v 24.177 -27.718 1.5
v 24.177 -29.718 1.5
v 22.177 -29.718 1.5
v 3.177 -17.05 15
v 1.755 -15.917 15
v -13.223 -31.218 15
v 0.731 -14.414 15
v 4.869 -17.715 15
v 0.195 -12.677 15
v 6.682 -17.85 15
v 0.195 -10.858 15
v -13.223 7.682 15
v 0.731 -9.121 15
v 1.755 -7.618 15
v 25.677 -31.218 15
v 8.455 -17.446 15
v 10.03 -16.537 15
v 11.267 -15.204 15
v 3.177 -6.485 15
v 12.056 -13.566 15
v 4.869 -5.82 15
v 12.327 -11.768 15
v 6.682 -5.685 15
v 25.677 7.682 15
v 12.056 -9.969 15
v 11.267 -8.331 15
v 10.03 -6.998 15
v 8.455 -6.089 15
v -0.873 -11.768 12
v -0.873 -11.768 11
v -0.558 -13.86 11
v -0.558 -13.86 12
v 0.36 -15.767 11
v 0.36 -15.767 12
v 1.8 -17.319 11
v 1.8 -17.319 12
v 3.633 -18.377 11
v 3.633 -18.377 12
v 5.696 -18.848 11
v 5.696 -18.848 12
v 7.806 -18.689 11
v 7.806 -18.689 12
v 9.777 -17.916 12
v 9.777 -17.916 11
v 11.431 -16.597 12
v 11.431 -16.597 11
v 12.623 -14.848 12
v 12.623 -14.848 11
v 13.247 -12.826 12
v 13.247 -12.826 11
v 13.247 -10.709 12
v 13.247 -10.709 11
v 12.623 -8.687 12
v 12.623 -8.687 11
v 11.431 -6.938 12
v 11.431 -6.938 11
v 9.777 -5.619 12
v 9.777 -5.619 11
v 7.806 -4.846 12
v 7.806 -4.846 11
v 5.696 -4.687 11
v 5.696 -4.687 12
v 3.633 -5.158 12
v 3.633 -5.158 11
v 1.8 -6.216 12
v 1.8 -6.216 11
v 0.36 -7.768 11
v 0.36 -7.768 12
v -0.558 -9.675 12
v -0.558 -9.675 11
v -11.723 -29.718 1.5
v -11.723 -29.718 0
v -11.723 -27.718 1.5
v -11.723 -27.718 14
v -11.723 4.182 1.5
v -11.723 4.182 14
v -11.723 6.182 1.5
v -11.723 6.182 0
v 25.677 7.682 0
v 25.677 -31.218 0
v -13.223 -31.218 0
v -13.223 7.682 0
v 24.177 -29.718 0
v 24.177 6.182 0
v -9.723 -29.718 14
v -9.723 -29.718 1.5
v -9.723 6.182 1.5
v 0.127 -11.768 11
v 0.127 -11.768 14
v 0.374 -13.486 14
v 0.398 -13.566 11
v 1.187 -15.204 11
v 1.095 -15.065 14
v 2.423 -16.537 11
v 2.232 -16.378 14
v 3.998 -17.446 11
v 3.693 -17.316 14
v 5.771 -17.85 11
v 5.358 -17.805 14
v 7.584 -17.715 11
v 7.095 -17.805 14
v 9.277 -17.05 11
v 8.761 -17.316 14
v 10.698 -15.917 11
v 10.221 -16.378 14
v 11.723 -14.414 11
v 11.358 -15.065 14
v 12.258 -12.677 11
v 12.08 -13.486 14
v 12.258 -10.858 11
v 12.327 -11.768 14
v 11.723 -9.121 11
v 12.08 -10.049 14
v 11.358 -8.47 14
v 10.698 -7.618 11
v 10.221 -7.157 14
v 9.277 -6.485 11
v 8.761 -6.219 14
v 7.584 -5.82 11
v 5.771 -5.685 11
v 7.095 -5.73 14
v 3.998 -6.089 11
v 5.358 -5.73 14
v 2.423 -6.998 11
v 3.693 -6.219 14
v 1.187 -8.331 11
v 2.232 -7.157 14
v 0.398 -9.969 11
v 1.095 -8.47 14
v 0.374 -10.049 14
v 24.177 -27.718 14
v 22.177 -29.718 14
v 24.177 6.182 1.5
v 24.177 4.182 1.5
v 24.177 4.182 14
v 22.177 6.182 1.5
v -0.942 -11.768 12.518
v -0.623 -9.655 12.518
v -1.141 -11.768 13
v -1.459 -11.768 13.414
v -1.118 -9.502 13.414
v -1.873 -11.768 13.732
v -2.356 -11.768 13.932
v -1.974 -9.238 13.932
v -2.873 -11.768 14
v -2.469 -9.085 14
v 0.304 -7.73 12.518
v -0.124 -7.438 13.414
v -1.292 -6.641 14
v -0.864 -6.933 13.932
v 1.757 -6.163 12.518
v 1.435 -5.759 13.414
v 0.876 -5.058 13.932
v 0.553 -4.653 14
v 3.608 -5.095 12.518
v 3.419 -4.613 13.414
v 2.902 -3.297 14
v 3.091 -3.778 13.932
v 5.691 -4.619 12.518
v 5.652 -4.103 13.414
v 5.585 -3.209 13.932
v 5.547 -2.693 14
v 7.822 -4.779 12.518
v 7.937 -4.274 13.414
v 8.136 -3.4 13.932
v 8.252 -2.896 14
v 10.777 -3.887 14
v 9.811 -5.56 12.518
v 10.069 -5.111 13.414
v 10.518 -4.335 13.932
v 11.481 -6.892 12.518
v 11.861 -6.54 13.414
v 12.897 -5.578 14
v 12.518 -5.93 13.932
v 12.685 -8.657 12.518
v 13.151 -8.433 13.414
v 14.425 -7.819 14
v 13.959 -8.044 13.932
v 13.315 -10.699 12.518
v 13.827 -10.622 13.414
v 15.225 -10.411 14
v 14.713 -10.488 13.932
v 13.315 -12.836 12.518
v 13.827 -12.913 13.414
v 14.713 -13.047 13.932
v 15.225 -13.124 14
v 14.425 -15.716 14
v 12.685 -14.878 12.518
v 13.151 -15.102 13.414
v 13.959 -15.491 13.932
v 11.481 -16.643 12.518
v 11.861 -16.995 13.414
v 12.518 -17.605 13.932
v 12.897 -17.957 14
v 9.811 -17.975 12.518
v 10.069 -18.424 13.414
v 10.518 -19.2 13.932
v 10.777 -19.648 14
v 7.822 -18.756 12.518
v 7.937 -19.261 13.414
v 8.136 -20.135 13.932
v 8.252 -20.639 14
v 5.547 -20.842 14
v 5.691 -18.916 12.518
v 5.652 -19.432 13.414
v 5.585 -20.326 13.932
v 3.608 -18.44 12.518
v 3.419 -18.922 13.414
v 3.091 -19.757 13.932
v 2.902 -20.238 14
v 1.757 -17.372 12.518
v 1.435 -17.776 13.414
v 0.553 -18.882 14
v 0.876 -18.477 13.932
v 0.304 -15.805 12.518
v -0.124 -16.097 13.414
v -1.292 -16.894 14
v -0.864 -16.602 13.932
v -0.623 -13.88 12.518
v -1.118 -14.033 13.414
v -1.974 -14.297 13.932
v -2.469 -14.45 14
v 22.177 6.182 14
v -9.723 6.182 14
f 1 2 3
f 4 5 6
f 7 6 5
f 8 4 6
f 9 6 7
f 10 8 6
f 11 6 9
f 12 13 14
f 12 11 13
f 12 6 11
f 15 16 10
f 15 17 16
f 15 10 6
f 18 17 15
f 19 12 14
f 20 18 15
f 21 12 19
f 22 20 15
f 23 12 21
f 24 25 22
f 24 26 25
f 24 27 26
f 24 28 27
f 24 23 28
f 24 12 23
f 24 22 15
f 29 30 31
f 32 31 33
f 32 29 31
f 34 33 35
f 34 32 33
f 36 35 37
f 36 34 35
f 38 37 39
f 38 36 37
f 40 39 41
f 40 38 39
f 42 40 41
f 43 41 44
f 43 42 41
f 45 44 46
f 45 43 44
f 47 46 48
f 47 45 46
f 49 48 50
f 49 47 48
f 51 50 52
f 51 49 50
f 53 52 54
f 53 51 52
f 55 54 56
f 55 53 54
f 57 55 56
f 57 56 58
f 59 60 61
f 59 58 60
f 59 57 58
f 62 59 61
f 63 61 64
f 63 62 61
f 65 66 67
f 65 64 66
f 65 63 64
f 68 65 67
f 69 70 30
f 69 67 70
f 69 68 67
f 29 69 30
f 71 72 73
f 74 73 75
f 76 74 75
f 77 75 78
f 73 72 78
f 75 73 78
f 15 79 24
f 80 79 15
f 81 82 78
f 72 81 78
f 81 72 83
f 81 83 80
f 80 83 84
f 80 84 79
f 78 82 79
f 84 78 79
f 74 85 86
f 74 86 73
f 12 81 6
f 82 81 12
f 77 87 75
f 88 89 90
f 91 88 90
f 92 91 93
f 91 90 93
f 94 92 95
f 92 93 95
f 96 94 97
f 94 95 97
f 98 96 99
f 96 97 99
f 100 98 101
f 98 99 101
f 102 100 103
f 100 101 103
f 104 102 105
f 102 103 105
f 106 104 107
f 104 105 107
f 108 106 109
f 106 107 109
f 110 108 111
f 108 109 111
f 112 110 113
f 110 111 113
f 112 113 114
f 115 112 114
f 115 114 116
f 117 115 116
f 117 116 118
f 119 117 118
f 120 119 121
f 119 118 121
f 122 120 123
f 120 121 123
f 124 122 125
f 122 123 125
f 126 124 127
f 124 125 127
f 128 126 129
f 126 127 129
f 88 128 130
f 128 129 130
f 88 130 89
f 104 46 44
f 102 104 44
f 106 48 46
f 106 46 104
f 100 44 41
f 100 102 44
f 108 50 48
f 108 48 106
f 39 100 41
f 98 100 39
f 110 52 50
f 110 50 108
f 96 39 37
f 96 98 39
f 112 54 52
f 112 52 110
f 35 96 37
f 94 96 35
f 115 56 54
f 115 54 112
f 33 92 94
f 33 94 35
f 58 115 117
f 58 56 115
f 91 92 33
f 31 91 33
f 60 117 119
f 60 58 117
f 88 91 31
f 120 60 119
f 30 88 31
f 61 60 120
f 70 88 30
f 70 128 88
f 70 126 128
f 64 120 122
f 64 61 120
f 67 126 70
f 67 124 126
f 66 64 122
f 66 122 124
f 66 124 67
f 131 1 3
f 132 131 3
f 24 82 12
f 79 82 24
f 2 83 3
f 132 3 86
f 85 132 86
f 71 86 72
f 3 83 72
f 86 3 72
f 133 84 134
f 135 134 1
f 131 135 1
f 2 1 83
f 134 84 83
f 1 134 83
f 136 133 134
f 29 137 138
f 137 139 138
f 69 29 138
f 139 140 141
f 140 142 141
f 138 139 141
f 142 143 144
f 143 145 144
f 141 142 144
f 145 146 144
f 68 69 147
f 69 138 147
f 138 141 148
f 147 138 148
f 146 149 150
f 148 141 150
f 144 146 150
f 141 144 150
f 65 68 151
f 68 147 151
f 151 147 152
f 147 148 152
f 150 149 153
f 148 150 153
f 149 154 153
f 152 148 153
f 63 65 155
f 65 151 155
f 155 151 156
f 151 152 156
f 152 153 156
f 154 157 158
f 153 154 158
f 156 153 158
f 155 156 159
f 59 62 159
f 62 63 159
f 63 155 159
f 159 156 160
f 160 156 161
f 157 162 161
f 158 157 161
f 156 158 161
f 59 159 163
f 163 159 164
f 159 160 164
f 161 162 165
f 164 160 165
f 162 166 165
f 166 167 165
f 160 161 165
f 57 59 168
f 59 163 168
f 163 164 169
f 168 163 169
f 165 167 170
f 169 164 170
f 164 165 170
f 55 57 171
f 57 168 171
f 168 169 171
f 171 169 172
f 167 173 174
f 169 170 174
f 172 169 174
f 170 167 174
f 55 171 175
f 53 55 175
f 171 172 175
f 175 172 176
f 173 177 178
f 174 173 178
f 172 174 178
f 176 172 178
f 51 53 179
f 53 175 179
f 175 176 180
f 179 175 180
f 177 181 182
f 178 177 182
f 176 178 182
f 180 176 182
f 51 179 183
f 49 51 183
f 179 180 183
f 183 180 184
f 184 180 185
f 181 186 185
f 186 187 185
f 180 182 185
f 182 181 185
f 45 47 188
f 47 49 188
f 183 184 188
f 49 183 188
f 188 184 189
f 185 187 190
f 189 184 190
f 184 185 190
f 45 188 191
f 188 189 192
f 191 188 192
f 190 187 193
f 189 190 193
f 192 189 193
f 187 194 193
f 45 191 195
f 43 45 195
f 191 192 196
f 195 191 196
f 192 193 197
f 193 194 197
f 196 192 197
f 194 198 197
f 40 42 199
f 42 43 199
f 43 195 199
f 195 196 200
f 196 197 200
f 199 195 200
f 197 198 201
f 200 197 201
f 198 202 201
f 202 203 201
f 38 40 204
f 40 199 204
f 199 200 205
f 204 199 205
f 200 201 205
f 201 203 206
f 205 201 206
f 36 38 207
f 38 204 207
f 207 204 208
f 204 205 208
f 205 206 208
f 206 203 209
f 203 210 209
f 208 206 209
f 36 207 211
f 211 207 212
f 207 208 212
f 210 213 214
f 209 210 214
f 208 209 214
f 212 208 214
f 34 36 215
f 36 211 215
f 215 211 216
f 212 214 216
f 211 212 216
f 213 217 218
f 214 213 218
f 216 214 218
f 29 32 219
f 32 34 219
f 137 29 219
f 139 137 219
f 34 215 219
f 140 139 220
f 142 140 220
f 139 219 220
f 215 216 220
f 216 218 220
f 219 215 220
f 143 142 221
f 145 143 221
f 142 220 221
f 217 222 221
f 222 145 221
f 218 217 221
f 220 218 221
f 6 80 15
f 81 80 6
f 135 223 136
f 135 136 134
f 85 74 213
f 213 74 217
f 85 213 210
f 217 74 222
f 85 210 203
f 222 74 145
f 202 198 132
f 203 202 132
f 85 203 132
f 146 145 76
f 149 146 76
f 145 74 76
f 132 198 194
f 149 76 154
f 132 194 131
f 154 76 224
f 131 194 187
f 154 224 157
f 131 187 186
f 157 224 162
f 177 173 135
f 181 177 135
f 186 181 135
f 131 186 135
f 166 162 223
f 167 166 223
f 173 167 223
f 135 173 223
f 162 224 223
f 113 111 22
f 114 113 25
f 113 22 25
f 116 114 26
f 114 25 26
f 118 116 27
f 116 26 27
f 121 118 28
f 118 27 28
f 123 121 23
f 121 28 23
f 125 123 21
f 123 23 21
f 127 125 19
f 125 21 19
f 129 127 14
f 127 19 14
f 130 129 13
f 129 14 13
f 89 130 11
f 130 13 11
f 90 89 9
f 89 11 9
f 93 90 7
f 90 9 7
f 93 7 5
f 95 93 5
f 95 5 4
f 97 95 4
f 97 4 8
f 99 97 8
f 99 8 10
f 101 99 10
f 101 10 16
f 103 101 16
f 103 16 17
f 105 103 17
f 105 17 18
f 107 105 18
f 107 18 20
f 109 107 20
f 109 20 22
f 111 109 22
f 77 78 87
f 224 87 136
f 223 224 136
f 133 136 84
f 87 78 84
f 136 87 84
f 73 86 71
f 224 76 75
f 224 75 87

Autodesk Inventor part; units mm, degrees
ref_plane "YZ Plane" through (0, 0, 0) normal (1, 0, 0) x (0, 1, 0)
ref_plane "XZ Plane" through (0, 0, 0) normal (0, 1, 0) x (-1, 0, 0)
ref_plane "XY Plane" through (0, 0, 0) normal (0, 0, 1) x (1, 0, 0)
sketch "Sketch1" plane through (0, 0, 0) normal (0, 0, 1) x (1, 0, 0)
  line L0 (-11.7234, 6.1825) -> (24.1766, 6.1825)
  line L1 (24.1766, 6.1825) -> (24.1766, -29.7175)
  line L2 (24.1766, -29.7175) -> (-11.7234, -29.7175)
  line L3 (-11.7234, -29.7175) -> (-11.7234, 6.1825)
  line L4 (-13.2234, 7.6825) -> (25.6766, 7.6825)
  line L5 (25.6766, 7.6825) -> (25.6766, -31.2175)
  line L6 (25.6766, -31.2175) -> (-13.2234, -31.2175)
  line L7 (-13.2234, -31.2175) -> (-13.2234, 7.6825)
  point P0 (0, 0)
  dimension "d0" = 35.9
  dimension "d1" = 35.9
  dimension "d2" = 38.9
  dimension "d3" = 38.9
  dimension "d4" = 1.5
  dimension "d5" = 1.5
extrude "Extrusion1" add sketch "Sketch1" along normal blind 14
sketch "Sketch2" plane through (0, 0, 14) normal (0, 0, 1) x (1, 0, 0)
  line L0 (-13.2234, -31.2175) -> (-13.2234, 7.6825) projected
  line L1 (-13.2234, -31.2175) -> (25.6766, -31.2175) projected
  line L2 (-13.2234, 7.6825) -> (25.6766, 7.6825)
  line L3 (25.6766, 7.6825) -> (25.6766, -31.2175)
  line L4 (25.6766, -31.2175) -> (-13.2234, -31.2175)
  line L5 (-13.2234, -31.2175) -> (-13.2234, 7.6825)
  point P0 (0, 0)
extrude "Extrusion2" add sketch "Sketch2" along normal blind 1
sketch "Sketch3" plane through (0, 0, 15) normal (0, 0, 1) x (1, 0, 0)
  circle A0 centre (6.2266, -11.7675) radius 6.1
  line L0 (-13.2234, 7.6825) -> (-13.2234, -31.2175) projected
  line L1 (-13.2234, -31.2175) -> (25.6766, -31.2175) projected
  point P0 (0, 0)
  dimension "d10" = 12.2
  dimension "d11" = 19.45
  dimension "d12" = 19.45
  dimension "d13" = 38.9
extrude "Extrusion3" cut sketch "Sketch3" against normal blind 1
sketch "Sketch4" plane through (0, 0, 14) normal (0, 0, -1) x (-1, 0, 0)
  circle A0 centre (-6.2266, -11.7675) radius 6.1 projected
  circle A1 centre (-6.2266, -11.7675) radius 7.1
  point P0 (0, 0)
  dimension "d16" = 14.2
extrude "Extrusion4" add sketch "Sketch4" along normal blind 3
fillet "Fillet1" radius 2 1 edges at (13.3266, -11.7675, 14)
sketch "Sketch5" plane through (0, 0, 14) normal (0, 0, -1) x (-1, 0, 0)
  line L0 (-24.1766, -29.7175) -> (11.7234, -29.7175) projected
  line L1 (11.7234, -29.7175) -> (9.7234, -29.7175)
  line L2 (9.7234, -29.7175) -> (11.7234, -27.7175)
  line L3 (11.7234, -29.7175) -> (11.7234, 6.1825) projected
  line L4 (11.7234, -27.7175) -> (11.7234, -29.7175)
  line L5 (11.7234, -29.7175) -> (11.7234, -27.7175)
  circle A0 centre (-6.2266, -11.7675) radius 6.1 projected
  line L6 (11.7234, 6.1825) -> (11.7234, 4.1825)
  line L7 (9.7234, 6.1825) -> (11.7234, 6.1825)
  line L8 (11.7234, 4.1825) -> (9.7234, 6.1825)
  line L9 (-24.1766, 6.1825) -> (-22.1766, 6.1825)
  line L10 (-24.1766, 4.1825) -> (-24.1766, 6.1825)
  line L11 (-22.1766, 6.1825) -> (-24.1766, 4.1825)
  line L12 (-24.1766, -29.7175) -> (-24.1766, -27.7175)
  line L13 (-22.1766, -29.7175) -> (-24.1766, -29.7175)
  line L14 (-24.1766, -27.7175) -> (-22.1766, -29.7175)
  point P0 (0, 0)
  dimension "d20" = 2
  dimension "d21" = 45
  dimension "d24" = 360
extrude "Extrusion5" add sketch "Sketch5" along normal blind 12.5 contours L12 L14 L0 | L2 L3 L0 | L8 L7 L3 | L9 L11 L10
equation "\"d11\" = 0.5 * d13"
equation "\"d12\" = 0.5 * d13"
properties part number "lupa_camera_mount"
